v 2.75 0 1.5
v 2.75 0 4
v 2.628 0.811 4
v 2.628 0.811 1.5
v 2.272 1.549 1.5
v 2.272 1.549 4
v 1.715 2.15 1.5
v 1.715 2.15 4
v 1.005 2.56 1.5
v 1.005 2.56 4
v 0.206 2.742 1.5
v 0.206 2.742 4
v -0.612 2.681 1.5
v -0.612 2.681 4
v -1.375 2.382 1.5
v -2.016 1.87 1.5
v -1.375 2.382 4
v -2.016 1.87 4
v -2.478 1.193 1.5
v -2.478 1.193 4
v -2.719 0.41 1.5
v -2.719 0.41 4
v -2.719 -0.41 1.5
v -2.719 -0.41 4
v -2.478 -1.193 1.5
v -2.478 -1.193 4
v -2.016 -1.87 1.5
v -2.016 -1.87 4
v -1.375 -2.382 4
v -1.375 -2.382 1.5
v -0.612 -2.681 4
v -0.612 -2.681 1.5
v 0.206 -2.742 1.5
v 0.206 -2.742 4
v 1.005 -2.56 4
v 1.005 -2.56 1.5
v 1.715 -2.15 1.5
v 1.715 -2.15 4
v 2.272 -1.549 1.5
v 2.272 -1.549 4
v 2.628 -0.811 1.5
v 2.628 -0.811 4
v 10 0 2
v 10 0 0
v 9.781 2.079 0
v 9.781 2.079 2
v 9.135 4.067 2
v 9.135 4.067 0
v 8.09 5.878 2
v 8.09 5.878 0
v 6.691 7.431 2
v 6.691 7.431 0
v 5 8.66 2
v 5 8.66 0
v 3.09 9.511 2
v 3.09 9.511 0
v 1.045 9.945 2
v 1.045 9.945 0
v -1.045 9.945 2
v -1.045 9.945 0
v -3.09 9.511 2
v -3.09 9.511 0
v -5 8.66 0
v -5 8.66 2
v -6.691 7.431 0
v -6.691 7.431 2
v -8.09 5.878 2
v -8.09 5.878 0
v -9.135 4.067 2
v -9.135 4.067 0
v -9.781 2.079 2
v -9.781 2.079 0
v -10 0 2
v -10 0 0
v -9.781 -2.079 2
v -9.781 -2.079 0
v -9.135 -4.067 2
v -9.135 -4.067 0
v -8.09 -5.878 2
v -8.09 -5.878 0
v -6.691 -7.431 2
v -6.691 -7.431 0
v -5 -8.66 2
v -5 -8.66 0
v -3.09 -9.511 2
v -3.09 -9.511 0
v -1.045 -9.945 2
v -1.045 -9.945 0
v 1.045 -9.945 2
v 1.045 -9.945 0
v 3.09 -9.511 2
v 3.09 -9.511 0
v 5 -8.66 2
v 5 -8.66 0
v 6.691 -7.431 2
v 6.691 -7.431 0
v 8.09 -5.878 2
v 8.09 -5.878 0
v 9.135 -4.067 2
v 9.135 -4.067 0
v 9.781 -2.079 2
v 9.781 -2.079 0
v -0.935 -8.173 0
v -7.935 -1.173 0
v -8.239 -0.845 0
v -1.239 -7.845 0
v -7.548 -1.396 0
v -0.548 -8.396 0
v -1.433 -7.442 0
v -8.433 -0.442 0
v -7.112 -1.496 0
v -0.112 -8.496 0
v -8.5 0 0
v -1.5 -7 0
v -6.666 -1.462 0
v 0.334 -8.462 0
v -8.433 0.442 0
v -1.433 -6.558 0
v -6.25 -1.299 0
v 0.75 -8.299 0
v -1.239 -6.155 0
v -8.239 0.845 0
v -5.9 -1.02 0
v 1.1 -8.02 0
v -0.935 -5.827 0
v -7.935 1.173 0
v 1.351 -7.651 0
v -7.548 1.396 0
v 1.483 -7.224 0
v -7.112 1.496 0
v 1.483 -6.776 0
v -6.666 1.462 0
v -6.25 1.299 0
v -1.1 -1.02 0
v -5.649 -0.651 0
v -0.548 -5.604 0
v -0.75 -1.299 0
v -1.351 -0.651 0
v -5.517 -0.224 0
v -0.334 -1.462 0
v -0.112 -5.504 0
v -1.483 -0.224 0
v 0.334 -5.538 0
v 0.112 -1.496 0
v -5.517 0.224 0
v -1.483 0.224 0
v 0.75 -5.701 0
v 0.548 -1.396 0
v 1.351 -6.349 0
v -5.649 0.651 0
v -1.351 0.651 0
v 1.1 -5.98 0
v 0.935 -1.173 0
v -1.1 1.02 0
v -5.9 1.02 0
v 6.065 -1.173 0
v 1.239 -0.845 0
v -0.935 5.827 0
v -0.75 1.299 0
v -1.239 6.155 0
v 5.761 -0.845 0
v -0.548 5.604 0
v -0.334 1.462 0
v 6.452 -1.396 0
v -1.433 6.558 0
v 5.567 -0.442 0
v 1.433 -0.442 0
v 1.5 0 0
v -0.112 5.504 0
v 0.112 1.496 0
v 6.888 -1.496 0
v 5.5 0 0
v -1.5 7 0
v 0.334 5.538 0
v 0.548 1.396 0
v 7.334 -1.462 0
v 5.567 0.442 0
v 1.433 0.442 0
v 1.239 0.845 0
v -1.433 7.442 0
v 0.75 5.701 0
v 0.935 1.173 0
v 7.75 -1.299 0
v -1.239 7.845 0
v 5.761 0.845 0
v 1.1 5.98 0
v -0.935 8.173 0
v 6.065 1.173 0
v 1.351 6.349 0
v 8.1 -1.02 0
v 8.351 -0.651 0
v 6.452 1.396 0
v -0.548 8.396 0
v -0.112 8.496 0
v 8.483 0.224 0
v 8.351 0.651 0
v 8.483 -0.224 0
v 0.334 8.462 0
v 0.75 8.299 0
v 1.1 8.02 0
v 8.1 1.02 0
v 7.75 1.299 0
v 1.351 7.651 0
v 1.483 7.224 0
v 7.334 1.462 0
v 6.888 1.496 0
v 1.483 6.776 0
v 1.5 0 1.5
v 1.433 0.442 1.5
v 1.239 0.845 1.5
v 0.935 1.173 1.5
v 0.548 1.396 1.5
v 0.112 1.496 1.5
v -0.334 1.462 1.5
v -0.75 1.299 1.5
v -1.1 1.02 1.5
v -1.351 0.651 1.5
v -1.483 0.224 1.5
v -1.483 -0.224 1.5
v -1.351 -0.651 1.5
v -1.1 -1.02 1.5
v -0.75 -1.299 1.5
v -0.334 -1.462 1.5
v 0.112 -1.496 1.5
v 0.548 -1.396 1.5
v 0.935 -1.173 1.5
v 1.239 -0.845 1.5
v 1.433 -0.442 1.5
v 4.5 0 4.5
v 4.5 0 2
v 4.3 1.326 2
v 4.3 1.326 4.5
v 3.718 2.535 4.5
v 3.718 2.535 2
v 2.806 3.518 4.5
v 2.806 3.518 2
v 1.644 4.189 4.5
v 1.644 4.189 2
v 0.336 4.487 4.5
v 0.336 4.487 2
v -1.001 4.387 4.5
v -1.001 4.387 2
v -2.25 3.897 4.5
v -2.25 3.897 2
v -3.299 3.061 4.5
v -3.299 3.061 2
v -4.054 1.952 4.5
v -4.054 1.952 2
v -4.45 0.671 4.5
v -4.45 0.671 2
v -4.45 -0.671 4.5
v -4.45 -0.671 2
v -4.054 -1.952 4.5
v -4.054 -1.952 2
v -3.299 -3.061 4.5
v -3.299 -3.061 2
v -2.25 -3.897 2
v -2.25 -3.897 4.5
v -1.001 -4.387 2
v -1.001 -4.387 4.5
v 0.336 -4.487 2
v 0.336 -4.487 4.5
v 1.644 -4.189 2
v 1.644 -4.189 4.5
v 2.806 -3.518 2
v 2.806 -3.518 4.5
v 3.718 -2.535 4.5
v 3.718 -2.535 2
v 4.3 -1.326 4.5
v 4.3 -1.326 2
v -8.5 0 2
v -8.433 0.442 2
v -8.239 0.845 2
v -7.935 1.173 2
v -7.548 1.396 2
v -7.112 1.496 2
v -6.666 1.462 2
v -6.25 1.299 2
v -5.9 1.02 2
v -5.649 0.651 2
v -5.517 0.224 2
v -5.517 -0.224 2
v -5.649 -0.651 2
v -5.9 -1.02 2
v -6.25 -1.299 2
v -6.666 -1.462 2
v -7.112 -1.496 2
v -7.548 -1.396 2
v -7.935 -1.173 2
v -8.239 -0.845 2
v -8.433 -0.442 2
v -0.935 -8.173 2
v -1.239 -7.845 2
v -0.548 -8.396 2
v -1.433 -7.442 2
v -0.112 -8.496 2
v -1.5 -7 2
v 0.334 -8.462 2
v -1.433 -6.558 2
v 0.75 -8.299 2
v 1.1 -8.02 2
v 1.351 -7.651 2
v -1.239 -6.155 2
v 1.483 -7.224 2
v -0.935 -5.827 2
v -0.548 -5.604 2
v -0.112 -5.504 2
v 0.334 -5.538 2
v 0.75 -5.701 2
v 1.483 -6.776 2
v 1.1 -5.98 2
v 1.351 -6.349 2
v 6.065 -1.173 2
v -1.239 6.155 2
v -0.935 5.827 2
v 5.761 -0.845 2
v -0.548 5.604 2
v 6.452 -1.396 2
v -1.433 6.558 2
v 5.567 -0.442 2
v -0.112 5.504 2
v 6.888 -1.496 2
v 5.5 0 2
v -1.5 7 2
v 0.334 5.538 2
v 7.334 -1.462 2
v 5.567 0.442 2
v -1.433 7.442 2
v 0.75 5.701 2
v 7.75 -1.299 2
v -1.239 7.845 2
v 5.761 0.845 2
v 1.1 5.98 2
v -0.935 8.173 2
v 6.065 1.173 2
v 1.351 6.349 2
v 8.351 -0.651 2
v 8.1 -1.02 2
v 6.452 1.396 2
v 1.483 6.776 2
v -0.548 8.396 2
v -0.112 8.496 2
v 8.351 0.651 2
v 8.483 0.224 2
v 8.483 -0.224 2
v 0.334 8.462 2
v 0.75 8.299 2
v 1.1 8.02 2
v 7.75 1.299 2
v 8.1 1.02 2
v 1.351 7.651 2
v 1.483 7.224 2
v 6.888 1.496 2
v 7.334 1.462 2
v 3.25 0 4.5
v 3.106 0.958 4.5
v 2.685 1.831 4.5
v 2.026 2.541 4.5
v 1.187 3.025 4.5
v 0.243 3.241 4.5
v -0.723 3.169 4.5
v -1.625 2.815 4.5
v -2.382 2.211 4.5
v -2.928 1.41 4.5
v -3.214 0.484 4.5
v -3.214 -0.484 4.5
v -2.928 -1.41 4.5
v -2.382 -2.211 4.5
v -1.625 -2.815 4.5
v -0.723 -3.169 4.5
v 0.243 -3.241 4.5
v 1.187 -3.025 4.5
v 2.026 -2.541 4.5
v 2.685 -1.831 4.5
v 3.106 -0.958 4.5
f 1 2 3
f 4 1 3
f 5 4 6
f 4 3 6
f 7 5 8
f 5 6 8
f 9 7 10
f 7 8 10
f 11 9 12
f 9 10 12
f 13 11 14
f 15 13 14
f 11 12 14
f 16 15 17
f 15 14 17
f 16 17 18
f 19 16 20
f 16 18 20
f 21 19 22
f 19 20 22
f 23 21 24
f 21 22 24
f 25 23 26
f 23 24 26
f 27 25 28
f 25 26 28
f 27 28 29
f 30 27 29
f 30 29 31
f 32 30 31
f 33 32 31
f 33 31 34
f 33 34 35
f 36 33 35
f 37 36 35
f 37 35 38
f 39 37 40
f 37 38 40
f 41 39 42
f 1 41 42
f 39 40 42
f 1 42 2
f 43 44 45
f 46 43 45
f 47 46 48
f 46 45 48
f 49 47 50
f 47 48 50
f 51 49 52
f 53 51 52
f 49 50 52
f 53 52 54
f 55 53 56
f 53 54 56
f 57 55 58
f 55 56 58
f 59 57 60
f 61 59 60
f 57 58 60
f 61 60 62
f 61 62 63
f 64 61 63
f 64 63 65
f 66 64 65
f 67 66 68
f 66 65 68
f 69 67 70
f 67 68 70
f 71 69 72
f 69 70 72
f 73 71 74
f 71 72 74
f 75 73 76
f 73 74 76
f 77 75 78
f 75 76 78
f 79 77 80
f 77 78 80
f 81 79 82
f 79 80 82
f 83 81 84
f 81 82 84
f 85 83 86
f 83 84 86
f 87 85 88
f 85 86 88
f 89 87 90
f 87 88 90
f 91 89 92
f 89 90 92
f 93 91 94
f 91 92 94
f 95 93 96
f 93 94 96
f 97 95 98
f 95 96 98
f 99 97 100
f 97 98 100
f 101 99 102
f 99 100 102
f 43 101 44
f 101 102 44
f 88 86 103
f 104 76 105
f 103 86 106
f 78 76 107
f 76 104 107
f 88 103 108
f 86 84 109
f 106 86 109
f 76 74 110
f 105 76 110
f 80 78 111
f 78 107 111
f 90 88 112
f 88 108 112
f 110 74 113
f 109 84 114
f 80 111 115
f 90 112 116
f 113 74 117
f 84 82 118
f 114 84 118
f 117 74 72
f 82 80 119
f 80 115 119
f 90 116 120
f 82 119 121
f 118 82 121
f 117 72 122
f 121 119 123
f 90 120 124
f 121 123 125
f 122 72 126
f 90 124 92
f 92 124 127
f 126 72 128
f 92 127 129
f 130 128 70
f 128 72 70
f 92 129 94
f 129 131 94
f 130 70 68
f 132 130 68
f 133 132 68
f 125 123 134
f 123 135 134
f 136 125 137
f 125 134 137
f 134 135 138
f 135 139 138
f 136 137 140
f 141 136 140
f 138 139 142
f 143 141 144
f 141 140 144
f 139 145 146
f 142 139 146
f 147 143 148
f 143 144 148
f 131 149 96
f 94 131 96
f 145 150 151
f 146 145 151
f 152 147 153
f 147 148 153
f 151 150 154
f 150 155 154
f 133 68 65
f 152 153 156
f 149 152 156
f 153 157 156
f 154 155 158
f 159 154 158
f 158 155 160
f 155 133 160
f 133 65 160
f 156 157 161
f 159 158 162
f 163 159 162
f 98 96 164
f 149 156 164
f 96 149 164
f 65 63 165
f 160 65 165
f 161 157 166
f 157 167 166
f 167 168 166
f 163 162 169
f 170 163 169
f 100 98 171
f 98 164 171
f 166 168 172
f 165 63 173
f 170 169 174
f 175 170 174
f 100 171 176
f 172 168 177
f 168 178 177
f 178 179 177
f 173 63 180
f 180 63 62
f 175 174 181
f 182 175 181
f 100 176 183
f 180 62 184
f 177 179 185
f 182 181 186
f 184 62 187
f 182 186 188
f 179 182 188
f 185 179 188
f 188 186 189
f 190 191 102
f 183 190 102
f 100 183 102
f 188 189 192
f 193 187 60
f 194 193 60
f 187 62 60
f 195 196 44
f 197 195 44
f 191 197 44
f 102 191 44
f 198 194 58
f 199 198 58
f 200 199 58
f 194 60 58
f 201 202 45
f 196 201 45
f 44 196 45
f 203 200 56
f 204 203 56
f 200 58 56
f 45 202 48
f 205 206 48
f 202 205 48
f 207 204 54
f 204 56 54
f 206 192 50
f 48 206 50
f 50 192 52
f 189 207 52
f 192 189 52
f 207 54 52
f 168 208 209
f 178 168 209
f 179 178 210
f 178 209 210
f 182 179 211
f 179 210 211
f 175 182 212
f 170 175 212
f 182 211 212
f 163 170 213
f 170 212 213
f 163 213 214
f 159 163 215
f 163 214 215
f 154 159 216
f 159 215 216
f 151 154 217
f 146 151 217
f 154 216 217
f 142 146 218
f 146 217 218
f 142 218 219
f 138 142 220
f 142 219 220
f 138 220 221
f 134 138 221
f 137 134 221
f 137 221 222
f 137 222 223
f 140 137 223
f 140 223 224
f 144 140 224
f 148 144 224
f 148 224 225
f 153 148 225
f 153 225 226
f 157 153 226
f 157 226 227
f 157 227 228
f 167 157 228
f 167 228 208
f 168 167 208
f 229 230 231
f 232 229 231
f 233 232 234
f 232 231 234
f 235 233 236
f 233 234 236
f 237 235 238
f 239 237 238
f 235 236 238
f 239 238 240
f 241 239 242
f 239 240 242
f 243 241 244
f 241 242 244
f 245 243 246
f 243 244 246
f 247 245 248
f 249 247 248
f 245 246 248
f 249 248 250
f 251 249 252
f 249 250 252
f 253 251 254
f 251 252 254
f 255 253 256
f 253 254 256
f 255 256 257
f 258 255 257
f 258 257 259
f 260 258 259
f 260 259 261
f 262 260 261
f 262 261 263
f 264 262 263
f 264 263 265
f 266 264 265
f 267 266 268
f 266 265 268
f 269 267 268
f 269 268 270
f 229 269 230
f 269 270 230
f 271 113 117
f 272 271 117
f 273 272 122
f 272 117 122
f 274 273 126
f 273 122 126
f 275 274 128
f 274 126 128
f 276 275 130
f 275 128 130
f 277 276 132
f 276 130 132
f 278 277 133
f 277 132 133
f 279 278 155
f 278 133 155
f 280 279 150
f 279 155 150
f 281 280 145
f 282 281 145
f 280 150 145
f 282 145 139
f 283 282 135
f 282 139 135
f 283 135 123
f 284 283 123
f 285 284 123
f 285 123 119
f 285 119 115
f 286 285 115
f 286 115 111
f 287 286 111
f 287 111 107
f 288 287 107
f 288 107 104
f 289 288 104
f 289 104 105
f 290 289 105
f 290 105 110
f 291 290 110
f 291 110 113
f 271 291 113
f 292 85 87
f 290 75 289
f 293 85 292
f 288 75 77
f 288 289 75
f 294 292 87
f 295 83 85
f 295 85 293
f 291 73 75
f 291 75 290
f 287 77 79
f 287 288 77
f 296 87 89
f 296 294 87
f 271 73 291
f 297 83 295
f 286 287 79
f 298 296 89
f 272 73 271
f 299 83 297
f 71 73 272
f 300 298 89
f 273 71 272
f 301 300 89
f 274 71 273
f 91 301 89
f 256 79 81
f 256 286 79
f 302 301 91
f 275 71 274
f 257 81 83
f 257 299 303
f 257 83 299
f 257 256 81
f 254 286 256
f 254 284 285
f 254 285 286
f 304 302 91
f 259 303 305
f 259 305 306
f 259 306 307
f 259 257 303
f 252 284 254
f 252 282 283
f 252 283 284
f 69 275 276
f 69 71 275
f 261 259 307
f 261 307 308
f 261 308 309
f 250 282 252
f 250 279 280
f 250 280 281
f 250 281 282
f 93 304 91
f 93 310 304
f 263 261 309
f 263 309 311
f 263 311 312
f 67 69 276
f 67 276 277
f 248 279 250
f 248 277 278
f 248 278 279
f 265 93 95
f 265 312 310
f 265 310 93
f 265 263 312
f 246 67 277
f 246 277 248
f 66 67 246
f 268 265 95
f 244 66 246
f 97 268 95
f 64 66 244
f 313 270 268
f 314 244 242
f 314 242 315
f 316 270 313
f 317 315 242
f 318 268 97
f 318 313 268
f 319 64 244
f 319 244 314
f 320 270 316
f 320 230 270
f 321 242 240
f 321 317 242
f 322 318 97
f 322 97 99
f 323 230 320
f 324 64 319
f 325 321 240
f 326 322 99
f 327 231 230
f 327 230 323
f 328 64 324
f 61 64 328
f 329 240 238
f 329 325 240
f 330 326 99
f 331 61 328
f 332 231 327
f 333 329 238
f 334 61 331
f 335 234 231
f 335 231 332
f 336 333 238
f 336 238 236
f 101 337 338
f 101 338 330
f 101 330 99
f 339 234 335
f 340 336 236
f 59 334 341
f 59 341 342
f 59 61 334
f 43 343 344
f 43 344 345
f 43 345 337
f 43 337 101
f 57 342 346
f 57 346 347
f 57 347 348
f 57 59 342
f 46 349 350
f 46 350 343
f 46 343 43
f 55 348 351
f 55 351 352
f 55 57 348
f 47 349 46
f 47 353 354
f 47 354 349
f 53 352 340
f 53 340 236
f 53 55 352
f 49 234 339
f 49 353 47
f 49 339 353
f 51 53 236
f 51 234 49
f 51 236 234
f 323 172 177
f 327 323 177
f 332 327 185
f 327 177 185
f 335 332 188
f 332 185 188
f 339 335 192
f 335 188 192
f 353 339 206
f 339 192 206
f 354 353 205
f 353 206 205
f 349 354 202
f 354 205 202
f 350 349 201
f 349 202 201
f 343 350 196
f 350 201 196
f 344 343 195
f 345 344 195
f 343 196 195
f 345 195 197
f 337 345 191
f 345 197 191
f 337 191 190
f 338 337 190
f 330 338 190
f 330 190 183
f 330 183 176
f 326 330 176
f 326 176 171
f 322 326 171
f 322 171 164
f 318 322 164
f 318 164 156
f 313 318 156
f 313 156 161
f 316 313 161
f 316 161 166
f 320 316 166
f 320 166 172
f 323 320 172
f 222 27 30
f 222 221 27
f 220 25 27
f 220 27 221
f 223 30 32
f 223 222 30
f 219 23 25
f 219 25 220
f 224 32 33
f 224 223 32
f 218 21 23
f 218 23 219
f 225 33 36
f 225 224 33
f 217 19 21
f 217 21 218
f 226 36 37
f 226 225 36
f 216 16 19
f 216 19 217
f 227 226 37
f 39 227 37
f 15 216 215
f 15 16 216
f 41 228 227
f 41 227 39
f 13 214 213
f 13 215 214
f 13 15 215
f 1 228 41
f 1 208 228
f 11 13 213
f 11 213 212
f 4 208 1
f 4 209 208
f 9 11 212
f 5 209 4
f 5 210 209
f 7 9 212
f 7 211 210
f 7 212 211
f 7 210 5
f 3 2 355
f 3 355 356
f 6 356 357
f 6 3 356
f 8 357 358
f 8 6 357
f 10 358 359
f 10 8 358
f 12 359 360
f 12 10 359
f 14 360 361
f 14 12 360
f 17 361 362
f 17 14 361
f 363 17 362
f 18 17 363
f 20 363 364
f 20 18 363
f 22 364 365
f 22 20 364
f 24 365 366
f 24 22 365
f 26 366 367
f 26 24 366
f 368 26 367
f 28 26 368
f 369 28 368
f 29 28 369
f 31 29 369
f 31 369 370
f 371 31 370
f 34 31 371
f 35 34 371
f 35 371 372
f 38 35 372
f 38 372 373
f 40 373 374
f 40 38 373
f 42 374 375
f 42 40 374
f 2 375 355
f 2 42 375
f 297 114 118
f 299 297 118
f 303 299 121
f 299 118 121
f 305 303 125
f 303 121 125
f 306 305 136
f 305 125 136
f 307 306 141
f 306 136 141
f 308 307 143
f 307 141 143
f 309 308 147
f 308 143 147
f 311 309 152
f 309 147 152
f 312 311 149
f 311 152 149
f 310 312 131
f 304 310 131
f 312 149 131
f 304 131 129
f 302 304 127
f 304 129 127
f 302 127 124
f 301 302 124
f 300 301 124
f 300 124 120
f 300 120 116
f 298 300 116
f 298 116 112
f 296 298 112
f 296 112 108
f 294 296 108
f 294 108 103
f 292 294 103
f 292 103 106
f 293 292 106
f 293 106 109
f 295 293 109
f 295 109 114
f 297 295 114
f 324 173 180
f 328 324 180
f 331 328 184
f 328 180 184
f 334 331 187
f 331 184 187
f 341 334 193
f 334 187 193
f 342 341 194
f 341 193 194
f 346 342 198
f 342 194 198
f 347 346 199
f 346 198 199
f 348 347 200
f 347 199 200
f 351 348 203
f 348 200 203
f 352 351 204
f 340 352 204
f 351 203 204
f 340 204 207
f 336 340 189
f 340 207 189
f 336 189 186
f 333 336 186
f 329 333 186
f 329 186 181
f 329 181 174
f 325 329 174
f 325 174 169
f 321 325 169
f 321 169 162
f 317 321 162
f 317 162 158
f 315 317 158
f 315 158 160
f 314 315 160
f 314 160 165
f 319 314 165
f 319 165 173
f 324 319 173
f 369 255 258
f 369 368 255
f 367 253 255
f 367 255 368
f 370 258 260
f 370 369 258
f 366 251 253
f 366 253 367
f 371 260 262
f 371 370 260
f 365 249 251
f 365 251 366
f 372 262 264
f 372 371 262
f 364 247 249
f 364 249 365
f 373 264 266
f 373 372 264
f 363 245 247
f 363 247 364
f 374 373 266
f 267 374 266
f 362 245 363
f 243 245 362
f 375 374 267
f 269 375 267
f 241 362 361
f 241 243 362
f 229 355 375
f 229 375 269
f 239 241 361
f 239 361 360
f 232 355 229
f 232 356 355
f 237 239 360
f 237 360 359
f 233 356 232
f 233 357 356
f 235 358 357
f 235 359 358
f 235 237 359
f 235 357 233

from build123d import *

# Parameters (mm, degrees)
SKETCH_1_R          = 10
EXTRUDE_1_DEPTH     = 2
SKETCH_3_R          = 4.5
EXTRUDE_2_DEPTH     = 2.5
SKETCH_4_R          = 1.5
CUT_EXTRUDE_1_DEPTH = 15.84082208
SKETCH_5_R          = 2.75
CUT_EXTRUDE_2_DEPTH = 3
CHAMFER_1_SIZE      = 0.5
SKETCH_6_R          = 1.5
CUT_EXTRUDE_3_DEPTH = 15.84082208


with BuildPart() as part:
    # 草图1 → 凸台-拉伸1 (new body)
    with BuildSketch(Plane.XY):
        Circle(SKETCH_1_R)
    extrude(amount=EXTRUDE_1_DEPTH)

    # 草图3 → 凸台-拉伸2 (add)
    with BuildSketch(Plane.XY.offset(2)):
        Circle(SKETCH_3_R)
    extrude(amount=EXTRUDE_2_DEPTH)

    # 草图4 → 切除-拉伸1 (cut, through all)
    with BuildSketch(Plane.XY.offset(4.5)):
        Circle(SKETCH_4_R)
    extrude(amount=-CUT_EXTRUDE_1_DEPTH, mode=Mode.SUBTRACT)

    # 草图5 → 切除-拉伸2 (cut)
    with BuildSketch(Plane.XY.offset(4.5)):
        Circle(SKETCH_5_R)
    extrude(amount=-CUT_EXTRUDE_2_DEPTH, mode=Mode.SUBTRACT)

    # 倒角1
    chamfer_1_edges = [part.edges().sort_by_distance(p)[0] for p in [
        (-2.75, 0, 4.5),
    ]]
    chamfer(chamfer_1_edges, length=CHAMFER_1_SIZE)

    # 草图6 → 切除-拉伸3 (cut, through all)
    with BuildSketch(Plane(origin=(0, 0, 0), x_dir=(-1, 0, 0), z_dir=(0, 0, -1))):
        with Locations((-7, 0)):
            Circle(SKETCH_6_R)
        with Locations((0, 7)):
            Circle(SKETCH_6_R)
        with Locations((7, 0)):
            Circle(SKETCH_6_R)
        with Locations((0, -7)):
            Circle(SKETCH_6_R)
    extrude(amount=-CUT_EXTRUDE_3_DEPTH, mode=Mode.SUBTRACT)


solid = part.part
